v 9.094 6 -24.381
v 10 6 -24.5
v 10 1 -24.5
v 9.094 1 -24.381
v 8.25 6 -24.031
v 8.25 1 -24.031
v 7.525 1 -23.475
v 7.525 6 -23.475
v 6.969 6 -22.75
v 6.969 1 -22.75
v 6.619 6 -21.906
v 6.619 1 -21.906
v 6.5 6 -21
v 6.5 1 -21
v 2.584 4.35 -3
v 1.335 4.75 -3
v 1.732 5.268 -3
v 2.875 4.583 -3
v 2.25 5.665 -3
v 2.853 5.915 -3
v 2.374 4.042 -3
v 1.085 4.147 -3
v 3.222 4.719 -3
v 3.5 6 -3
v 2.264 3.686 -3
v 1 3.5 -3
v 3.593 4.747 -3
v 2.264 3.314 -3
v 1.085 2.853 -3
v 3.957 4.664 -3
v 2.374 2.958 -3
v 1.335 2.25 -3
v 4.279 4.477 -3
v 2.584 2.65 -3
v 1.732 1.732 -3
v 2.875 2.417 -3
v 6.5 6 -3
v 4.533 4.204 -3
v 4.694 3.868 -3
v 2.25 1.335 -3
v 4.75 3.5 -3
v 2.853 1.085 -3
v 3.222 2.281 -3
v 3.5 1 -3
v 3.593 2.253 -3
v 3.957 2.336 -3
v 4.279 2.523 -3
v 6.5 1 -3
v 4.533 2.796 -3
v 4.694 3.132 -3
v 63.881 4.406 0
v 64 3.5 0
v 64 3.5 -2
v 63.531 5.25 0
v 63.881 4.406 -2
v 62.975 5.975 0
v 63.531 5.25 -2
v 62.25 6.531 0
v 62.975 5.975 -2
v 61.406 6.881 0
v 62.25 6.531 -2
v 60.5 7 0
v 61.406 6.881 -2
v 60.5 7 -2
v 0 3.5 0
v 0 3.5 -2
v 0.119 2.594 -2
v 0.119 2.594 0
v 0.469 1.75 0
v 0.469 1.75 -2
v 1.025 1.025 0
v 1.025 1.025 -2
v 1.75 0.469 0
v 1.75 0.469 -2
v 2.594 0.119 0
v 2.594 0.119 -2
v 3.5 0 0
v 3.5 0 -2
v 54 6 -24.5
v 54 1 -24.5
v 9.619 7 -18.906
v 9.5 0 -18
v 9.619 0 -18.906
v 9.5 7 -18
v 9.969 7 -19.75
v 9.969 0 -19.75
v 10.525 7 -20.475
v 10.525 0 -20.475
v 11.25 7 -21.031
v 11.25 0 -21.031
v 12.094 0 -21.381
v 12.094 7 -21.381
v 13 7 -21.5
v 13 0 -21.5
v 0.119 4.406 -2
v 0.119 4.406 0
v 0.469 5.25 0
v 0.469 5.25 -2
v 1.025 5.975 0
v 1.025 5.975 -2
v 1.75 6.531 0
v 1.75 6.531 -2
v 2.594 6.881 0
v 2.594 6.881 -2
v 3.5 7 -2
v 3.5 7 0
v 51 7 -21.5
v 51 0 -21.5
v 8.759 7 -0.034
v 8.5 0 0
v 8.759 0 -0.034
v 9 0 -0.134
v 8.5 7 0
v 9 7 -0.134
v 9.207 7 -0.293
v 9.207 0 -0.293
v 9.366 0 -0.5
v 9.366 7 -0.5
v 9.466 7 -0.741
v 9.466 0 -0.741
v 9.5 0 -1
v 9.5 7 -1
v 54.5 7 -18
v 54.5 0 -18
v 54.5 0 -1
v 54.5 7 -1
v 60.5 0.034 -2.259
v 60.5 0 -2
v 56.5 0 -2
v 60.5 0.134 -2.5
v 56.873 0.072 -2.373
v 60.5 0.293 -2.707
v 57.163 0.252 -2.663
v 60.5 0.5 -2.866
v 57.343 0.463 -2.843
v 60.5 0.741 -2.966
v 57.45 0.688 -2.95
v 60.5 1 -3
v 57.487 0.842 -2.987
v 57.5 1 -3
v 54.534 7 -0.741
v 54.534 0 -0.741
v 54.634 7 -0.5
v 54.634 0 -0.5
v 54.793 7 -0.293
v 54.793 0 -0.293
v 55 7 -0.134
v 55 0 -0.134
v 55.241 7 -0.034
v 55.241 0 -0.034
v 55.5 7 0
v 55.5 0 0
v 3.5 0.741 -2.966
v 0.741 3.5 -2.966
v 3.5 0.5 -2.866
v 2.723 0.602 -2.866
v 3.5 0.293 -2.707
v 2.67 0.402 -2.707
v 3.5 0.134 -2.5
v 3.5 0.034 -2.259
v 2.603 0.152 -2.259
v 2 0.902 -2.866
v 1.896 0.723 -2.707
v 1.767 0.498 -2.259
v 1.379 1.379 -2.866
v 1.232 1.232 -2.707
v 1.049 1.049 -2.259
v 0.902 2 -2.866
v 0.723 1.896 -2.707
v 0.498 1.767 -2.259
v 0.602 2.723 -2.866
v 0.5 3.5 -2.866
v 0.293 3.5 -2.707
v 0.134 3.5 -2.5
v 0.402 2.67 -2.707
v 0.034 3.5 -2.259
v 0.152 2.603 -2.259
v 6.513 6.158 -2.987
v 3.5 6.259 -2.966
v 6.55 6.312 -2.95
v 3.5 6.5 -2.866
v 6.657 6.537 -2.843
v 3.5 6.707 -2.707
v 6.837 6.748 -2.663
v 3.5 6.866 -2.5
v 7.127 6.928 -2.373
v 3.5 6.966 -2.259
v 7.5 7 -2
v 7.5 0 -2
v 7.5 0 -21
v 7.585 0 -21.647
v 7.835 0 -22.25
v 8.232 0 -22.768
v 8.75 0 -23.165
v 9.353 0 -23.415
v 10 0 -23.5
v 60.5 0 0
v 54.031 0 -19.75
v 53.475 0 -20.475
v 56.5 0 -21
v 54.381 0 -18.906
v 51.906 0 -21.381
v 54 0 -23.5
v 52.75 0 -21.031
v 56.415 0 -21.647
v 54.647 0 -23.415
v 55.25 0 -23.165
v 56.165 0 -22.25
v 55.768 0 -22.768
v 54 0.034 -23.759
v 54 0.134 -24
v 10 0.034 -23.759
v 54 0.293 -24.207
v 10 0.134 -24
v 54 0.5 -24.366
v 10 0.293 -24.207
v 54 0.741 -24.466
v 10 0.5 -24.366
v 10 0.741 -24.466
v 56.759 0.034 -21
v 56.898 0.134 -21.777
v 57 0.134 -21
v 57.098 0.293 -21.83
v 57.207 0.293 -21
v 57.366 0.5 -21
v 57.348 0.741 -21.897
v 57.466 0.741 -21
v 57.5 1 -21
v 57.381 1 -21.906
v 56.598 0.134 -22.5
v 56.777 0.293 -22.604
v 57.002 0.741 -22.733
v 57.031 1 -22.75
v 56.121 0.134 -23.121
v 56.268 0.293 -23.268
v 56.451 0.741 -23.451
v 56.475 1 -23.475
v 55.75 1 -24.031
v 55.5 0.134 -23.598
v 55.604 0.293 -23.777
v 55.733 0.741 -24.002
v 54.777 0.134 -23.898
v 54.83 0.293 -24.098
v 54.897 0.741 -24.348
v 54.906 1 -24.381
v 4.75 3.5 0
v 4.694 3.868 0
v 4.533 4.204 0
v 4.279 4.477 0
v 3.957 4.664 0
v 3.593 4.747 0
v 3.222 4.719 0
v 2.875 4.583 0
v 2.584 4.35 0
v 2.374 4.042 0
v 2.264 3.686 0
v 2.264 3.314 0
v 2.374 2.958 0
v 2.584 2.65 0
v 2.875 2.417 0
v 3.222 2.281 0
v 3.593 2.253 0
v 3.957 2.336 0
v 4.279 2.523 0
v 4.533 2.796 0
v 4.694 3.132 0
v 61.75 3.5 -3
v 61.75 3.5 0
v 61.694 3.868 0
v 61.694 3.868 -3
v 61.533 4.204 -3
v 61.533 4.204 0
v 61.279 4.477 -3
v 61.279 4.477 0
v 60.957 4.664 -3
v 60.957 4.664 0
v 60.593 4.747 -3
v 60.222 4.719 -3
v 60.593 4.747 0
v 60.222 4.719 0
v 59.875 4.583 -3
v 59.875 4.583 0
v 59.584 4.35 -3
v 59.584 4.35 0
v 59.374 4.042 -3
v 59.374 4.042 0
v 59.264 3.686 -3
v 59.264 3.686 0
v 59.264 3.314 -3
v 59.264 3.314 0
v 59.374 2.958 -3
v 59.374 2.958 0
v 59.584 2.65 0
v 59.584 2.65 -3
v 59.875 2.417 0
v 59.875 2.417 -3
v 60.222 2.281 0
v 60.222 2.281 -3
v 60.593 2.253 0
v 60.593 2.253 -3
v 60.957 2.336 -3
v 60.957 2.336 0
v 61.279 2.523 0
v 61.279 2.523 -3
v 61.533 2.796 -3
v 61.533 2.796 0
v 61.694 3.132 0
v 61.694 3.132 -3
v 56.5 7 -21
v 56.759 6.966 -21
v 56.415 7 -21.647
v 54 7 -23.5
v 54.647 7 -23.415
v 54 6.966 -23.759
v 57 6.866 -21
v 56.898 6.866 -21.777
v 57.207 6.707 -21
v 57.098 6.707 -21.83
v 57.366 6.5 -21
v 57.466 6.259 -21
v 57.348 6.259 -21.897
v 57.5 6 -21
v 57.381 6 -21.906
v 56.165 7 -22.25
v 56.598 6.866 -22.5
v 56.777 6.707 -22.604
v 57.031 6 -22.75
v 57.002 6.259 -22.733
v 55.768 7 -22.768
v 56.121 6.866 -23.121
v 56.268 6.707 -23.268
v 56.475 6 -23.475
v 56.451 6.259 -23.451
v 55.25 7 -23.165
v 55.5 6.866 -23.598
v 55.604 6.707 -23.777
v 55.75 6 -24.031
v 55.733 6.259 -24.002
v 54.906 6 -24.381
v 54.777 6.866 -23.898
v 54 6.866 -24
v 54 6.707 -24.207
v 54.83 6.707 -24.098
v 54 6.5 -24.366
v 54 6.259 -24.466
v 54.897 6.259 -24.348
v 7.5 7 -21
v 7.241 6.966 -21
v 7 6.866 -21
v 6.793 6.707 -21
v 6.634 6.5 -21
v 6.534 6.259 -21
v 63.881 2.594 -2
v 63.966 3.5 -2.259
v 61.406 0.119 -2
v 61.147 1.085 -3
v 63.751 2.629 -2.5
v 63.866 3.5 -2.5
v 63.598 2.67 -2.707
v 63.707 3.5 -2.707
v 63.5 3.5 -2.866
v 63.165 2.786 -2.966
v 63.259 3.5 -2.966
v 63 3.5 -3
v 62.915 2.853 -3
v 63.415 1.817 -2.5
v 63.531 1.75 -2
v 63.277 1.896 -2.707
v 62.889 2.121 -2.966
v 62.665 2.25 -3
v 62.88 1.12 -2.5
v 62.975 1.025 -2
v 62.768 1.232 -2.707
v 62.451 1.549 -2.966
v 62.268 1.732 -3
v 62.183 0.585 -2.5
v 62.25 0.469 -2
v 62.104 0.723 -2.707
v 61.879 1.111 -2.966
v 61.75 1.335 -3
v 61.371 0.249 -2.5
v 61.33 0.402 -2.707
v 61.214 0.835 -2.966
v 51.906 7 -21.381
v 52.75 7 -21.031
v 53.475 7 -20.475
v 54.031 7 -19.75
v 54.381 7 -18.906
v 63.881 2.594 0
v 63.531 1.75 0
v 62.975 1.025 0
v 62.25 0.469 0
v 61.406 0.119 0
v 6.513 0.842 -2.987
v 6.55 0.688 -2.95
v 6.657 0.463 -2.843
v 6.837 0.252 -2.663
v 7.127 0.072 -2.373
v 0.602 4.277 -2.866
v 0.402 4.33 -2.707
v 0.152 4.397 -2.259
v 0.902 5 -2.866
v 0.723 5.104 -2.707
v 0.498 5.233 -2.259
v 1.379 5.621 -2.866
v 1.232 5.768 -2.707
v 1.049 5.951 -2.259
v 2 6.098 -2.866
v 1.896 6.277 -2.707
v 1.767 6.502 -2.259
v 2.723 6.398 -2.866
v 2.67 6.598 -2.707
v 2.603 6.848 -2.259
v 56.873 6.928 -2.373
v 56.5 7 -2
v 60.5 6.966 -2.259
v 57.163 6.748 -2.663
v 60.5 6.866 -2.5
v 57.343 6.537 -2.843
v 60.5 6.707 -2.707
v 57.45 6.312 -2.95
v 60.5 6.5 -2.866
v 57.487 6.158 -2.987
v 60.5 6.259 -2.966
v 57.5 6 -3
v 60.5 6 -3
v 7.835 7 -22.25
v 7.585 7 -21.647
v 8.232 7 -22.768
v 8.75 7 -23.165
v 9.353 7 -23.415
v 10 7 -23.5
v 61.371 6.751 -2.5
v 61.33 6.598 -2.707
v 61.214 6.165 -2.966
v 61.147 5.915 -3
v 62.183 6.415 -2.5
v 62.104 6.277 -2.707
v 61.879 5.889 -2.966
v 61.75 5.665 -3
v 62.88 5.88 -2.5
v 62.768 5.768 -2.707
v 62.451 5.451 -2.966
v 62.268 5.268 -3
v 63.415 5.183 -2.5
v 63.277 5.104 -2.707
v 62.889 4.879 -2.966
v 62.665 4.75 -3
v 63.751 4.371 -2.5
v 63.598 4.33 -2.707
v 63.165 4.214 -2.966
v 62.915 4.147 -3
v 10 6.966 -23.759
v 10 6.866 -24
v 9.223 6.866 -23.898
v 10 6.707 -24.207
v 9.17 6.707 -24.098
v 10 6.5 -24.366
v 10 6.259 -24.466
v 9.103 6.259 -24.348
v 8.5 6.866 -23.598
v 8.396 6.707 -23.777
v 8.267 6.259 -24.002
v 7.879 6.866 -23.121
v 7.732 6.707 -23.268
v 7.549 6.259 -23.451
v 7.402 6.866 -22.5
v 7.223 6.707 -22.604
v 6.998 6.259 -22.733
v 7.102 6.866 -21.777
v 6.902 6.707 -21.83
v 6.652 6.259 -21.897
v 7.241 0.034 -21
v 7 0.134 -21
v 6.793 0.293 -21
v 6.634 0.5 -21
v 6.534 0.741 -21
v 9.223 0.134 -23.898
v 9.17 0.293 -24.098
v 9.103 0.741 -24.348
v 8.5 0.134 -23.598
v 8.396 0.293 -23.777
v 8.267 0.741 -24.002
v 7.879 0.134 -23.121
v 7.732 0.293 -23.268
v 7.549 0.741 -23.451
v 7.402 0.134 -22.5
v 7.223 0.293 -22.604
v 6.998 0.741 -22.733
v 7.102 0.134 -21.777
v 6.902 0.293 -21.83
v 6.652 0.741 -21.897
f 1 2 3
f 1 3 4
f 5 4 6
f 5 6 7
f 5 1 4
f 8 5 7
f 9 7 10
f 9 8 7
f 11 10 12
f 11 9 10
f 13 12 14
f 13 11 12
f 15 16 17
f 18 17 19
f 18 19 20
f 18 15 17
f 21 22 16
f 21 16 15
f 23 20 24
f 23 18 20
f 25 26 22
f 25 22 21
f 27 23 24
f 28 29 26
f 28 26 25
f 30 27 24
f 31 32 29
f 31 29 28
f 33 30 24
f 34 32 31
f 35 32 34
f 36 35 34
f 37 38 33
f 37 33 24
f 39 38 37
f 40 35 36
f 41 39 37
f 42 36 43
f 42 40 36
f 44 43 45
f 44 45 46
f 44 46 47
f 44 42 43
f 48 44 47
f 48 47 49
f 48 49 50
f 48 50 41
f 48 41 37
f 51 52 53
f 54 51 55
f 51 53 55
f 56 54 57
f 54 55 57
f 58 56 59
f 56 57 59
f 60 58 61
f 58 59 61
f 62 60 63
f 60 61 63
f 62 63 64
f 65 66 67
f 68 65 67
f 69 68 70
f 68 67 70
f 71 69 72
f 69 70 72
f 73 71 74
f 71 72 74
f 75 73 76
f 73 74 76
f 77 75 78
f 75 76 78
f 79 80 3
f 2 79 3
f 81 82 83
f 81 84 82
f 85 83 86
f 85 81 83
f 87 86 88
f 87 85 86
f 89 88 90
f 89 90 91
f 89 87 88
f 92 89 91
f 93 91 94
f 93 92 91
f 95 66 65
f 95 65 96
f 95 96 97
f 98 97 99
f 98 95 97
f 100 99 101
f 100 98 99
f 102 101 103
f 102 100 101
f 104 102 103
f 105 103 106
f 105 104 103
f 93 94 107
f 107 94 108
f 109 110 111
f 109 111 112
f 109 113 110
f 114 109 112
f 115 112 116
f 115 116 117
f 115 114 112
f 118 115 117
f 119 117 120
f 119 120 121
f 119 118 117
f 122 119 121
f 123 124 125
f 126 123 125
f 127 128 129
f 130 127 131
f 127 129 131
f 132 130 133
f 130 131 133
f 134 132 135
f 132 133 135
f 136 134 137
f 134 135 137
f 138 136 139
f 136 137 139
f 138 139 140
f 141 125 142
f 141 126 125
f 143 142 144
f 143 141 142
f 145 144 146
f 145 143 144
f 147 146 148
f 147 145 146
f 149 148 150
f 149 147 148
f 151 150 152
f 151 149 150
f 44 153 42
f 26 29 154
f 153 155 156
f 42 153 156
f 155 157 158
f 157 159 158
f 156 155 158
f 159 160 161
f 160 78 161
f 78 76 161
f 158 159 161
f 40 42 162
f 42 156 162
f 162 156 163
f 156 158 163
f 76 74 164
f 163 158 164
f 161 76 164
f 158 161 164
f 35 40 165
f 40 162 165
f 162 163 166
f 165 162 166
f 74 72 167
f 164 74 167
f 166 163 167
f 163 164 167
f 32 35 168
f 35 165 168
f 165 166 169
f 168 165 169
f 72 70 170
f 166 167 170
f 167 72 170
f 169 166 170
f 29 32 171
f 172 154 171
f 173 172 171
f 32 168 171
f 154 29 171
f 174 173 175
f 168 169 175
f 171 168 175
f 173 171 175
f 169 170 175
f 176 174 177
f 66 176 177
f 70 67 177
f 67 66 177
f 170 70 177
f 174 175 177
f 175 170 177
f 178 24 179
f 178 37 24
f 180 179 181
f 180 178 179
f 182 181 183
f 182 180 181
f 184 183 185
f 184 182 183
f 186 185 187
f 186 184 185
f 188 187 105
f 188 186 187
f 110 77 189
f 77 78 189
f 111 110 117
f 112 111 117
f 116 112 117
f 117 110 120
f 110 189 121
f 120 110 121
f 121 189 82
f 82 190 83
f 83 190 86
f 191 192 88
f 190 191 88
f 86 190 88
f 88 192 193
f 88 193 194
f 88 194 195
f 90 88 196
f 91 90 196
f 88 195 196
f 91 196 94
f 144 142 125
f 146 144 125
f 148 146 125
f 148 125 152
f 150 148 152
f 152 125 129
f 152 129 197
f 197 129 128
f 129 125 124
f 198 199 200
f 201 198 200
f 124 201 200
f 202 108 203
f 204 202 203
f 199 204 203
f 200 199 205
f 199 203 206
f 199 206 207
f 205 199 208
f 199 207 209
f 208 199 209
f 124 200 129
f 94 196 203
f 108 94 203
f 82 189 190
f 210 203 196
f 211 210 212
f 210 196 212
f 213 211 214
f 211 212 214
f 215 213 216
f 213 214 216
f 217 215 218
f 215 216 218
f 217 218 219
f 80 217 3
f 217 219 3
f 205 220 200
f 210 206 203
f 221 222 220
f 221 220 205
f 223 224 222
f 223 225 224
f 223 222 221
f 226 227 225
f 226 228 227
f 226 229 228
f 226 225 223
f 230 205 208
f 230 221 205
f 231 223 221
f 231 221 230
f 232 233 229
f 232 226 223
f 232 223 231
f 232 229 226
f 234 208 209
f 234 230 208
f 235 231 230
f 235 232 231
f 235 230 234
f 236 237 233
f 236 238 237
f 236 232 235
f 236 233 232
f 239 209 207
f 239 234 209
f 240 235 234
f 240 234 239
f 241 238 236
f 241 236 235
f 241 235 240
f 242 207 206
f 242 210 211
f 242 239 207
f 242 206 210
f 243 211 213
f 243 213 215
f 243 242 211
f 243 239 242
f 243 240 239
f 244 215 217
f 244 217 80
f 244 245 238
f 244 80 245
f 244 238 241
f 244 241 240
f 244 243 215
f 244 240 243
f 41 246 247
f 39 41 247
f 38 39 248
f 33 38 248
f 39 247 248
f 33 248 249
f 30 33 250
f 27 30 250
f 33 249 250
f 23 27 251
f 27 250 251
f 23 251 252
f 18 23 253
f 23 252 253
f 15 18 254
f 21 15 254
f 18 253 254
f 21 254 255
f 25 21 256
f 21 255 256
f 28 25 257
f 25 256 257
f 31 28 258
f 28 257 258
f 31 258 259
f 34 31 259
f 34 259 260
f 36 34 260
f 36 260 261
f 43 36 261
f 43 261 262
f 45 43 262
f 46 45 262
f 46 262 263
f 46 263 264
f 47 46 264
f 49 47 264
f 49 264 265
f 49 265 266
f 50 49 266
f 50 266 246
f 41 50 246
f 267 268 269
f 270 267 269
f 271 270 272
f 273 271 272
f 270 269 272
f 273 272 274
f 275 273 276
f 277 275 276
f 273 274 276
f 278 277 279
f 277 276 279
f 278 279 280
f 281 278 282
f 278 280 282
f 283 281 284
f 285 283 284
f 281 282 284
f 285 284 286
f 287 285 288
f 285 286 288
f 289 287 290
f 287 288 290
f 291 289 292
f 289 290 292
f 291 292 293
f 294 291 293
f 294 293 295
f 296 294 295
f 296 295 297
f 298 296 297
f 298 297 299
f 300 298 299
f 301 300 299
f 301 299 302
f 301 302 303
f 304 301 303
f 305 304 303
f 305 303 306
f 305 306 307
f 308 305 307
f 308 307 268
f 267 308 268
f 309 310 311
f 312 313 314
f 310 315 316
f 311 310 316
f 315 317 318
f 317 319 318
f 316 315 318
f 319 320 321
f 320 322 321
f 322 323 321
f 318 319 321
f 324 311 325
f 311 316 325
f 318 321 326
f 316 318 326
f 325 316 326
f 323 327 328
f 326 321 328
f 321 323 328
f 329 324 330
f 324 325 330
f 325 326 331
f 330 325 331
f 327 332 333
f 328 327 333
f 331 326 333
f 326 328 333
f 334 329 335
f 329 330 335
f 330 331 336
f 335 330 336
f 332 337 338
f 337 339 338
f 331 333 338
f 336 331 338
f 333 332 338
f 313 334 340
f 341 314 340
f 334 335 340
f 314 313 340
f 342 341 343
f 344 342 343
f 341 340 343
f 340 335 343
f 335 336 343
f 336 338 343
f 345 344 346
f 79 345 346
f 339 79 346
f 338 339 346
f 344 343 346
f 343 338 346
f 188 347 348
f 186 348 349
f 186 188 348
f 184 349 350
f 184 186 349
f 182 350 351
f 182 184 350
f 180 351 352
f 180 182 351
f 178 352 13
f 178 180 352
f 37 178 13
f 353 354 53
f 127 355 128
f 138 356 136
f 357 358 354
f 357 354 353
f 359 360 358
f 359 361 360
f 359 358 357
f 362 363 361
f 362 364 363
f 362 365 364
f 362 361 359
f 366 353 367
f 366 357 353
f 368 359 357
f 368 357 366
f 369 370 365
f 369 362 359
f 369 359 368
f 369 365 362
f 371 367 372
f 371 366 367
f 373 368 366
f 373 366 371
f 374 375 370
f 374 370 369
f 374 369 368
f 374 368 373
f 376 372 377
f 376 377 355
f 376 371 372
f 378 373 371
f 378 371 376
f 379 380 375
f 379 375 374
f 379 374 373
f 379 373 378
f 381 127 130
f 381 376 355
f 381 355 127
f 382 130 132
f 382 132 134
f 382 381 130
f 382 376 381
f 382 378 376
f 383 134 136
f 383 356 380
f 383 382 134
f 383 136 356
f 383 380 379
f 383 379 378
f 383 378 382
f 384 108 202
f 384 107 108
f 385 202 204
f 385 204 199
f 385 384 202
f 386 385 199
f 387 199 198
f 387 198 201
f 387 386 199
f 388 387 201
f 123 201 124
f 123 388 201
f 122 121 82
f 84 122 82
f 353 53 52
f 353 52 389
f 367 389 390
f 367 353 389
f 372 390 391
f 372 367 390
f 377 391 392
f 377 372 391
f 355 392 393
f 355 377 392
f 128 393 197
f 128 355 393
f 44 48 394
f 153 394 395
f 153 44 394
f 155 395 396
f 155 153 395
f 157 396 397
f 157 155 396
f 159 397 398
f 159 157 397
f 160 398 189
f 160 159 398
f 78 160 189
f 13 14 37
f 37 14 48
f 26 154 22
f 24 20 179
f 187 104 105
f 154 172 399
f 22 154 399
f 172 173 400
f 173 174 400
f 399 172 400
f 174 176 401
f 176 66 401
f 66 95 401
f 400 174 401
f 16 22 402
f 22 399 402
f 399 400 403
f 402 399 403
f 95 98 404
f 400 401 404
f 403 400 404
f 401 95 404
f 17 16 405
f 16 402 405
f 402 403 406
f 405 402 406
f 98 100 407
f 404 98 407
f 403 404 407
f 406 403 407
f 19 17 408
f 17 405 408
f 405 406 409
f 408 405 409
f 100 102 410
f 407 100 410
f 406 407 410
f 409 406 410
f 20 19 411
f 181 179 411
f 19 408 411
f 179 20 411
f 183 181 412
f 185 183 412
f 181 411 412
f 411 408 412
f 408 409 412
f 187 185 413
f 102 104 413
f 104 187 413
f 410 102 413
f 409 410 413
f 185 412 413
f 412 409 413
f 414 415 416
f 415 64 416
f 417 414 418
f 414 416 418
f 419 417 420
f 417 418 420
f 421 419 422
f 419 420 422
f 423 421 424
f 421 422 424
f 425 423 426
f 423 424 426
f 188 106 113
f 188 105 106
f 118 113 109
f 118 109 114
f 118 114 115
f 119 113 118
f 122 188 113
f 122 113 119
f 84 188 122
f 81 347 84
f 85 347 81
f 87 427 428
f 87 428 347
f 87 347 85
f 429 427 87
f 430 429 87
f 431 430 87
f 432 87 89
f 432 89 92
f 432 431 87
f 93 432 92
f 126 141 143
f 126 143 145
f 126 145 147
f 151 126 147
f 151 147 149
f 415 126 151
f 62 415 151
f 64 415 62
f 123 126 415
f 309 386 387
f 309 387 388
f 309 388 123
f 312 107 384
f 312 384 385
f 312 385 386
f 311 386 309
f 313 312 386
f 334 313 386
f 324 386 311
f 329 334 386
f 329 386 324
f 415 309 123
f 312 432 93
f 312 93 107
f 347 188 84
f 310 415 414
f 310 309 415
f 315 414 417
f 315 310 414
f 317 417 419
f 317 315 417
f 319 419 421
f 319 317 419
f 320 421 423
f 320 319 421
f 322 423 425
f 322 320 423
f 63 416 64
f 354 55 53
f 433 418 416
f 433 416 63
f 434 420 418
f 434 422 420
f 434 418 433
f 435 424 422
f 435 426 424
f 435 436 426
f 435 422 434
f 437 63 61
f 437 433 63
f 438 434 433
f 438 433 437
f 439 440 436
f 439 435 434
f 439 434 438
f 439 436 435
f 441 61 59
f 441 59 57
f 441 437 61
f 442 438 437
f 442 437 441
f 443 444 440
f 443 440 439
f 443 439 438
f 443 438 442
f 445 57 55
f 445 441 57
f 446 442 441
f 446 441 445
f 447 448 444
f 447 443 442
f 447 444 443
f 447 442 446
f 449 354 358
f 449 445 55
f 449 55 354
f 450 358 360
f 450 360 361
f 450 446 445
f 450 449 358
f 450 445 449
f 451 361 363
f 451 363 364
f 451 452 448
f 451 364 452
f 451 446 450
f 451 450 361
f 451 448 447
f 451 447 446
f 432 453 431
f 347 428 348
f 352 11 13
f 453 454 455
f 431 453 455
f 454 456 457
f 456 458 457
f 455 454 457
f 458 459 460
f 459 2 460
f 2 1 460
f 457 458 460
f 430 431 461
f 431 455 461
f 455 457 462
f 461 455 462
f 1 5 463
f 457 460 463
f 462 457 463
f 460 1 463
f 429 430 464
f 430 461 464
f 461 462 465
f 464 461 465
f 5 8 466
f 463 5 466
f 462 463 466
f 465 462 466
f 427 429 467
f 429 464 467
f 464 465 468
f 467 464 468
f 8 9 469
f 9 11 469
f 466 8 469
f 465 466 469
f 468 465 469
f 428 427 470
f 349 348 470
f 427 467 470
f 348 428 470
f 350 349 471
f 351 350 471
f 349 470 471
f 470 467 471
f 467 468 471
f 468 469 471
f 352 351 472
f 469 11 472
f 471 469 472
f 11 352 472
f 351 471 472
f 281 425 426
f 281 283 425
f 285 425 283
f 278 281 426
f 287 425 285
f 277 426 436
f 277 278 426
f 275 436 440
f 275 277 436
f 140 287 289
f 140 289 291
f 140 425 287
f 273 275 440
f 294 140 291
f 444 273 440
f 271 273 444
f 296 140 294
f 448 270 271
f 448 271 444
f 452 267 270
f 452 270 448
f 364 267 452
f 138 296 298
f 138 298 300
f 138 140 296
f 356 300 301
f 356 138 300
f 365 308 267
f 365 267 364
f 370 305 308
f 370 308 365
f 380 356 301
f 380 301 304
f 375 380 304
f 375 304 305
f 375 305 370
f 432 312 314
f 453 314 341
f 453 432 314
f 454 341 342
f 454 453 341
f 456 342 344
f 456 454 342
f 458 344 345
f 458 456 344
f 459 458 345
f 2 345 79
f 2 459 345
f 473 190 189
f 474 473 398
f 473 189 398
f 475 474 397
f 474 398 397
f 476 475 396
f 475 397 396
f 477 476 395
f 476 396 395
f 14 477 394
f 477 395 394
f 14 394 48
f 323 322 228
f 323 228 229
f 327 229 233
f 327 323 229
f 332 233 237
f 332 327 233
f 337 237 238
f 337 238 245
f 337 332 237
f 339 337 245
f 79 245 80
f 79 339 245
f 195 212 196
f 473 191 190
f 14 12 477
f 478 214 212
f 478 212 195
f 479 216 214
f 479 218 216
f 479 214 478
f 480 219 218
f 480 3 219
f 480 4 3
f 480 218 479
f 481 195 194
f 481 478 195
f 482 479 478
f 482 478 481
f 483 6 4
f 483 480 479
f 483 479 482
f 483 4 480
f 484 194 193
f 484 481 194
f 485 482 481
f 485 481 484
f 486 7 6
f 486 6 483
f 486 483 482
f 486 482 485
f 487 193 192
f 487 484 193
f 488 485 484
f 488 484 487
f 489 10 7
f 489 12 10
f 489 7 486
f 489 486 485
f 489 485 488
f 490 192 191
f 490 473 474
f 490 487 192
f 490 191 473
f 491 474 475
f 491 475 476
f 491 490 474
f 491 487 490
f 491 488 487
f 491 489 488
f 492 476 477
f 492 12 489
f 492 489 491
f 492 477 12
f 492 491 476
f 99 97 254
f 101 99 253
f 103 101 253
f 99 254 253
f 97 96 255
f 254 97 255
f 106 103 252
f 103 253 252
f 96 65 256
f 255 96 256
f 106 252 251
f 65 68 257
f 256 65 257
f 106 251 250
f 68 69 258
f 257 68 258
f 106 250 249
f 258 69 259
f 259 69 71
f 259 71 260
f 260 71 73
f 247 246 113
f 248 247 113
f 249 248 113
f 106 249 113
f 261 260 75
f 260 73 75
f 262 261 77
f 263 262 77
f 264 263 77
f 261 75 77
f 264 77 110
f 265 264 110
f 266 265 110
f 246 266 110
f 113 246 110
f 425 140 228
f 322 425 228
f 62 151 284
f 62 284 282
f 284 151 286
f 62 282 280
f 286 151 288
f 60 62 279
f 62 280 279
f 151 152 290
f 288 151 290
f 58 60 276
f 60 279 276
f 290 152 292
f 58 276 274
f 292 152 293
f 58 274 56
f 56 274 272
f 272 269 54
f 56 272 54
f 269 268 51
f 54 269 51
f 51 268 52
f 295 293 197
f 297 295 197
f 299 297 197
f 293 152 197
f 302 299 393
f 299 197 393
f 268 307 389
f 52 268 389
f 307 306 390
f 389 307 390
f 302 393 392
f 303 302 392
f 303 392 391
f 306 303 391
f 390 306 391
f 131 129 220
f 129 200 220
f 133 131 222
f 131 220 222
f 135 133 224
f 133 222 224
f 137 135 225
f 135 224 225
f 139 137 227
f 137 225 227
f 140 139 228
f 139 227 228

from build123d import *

# Parameters (mm, degrees)
SKETCH_1_W          = 6.5
SKETCH_1_H          = 3
SKETCH_1_W_2        = 22.5
EXTRUDE_1_DEPTH     = 7
FILLET_3_R          = 3.5
CUT_EXTRUDE_1_REACH = 70.886
SKETCH_2_R          = 1.25
FILLET_4_R          = 1
FILLET_5_R          = 1


with BuildPart() as part:
    # Эскиз1 → Бобышка-Вытянуть1 (new body)
    with BuildSketch(Plane(origin=(0, 0, 0), x_dir=(1, 0, 0), z_dir=(0, 1, 0))):
        with Locations((3.25, 1.5)):
            Rectangle(SKETCH_1_W, SKETCH_1_H)
        Polygon((9.5, 21.5), (9.5, 24.5), (6.5, 24.5), (6.5, 3), (6.5, 0), (9.5, 0), align=None)
        with Locations((20.75, 23)):
            Rectangle(SKETCH_1_W_2, SKETCH_1_H)
        with Locations((43.25, 23)):
            Rectangle(SKETCH_1_W_2, SKETCH_1_H)
        Polygon((57.5, 24.5), (54.5, 24.5), (54.5, 21.5), (54.5, 0), (57.5, 0), (57.5, 3), align=None)
        with Locations((60.75, 1.5)):
            Rectangle(SKETCH_1_W, SKETCH_1_H)
    extrude(amount=EXTRUDE_1_DEPTH)

    # Скругление3
    fillet_3_edges = [part.edges().sort_by_distance(p)[0] for p in [
        (64, 0, -1.5),
        (64, 7, -1.5),
        (0, 0, -1.5),
        (0, 7, -1.5),
        (57.5, 3.5, -24.5),
        (6.5, 3.5, -24.5),
        (54.5, 3.5, -21.5),
        (9.5, 3.5, -21.5),
    ]]
    fillet(fillet_3_edges, radius=FILLET_3_R - 0.0001)  # a hair under: the kernel refuses the full size

    # Эскиз2 → Вырез-Вытянуть1 (cut, up to next)
    with BuildSketch(Plane.XY, mode=Mode.PRIVATE) as cut_extrude_1_sk1:
        with Locations((3.5, 3.5)):
            Circle(SKETCH_2_R)
    cut_extrude_1_tool1 = extrude(cut_extrude_1_sk1.sketch, amount=-CUT_EXTRUDE_1_REACH, mode=Mode.PRIVATE) & part.part
    # Эскиз2 → Вырез-Вытянуть1 (cut, up to next)
    with BuildSketch(Plane.XY, mode=Mode.PRIVATE) as cut_extrude_1_sk2:
        with Locations((60.5, 3.5)):
            Circle(SKETCH_2_R)
    cut_extrude_1_tool2 = extrude(cut_extrude_1_sk2.sketch, amount=-CUT_EXTRUDE_1_REACH, mode=Mode.PRIVATE) & part.part
    add(cut_extrude_1_tool1.solids().sort_by_distance((3.5, 3.5, 0))[0], mode=Mode.SUBTRACT)
    add(cut_extrude_1_tool2.solids().sort_by_distance((60.5, 3.5, 0))[0], mode=Mode.SUBTRACT)

    # Скругление4
    fillet_4_edges = [part.edges().sort_by_distance(p)[0] for p in [
        (6.5, 0, -12.00005),
        (57.5, 0, -12.00005),
        (57.5, 7, -12.00005),
        (59.00005, 7, -3),
        (32, 7, -24.5),
        (4.99995, 7, -3),
        (7.525096977, 7, -23.474903023),
        (56.474903023, 7, -23.474903023),
        (59.00005, 0, -3),
        (62.974903023, 1.025096977, -3),
        (62.974903023, 5.974903023, -3),
        (6.5, 7, -12.00005),
        (4.99995, 0, -3),
        (32, 0, -24.5),
        (7.525096977, 0, -23.474903023),
        (56.474903023, 0, -23.474903023),
        (1.025096977, 5.974903023, -3),
        (1.025096977, 1.025096977, -3),
    ]]
    fillet(fillet_4_edges, radius=FILLET_4_R)

    # Скругление5
    fillet_5_edges = [part.edges().sort_by_distance(p)[0] for p in [
        (54.5, 3.5, 0),
        (9.5, 3.5, 0),
    ]]
    fillet(fillet_5_edges, radius=FILLET_5_R)


solid = part.part
